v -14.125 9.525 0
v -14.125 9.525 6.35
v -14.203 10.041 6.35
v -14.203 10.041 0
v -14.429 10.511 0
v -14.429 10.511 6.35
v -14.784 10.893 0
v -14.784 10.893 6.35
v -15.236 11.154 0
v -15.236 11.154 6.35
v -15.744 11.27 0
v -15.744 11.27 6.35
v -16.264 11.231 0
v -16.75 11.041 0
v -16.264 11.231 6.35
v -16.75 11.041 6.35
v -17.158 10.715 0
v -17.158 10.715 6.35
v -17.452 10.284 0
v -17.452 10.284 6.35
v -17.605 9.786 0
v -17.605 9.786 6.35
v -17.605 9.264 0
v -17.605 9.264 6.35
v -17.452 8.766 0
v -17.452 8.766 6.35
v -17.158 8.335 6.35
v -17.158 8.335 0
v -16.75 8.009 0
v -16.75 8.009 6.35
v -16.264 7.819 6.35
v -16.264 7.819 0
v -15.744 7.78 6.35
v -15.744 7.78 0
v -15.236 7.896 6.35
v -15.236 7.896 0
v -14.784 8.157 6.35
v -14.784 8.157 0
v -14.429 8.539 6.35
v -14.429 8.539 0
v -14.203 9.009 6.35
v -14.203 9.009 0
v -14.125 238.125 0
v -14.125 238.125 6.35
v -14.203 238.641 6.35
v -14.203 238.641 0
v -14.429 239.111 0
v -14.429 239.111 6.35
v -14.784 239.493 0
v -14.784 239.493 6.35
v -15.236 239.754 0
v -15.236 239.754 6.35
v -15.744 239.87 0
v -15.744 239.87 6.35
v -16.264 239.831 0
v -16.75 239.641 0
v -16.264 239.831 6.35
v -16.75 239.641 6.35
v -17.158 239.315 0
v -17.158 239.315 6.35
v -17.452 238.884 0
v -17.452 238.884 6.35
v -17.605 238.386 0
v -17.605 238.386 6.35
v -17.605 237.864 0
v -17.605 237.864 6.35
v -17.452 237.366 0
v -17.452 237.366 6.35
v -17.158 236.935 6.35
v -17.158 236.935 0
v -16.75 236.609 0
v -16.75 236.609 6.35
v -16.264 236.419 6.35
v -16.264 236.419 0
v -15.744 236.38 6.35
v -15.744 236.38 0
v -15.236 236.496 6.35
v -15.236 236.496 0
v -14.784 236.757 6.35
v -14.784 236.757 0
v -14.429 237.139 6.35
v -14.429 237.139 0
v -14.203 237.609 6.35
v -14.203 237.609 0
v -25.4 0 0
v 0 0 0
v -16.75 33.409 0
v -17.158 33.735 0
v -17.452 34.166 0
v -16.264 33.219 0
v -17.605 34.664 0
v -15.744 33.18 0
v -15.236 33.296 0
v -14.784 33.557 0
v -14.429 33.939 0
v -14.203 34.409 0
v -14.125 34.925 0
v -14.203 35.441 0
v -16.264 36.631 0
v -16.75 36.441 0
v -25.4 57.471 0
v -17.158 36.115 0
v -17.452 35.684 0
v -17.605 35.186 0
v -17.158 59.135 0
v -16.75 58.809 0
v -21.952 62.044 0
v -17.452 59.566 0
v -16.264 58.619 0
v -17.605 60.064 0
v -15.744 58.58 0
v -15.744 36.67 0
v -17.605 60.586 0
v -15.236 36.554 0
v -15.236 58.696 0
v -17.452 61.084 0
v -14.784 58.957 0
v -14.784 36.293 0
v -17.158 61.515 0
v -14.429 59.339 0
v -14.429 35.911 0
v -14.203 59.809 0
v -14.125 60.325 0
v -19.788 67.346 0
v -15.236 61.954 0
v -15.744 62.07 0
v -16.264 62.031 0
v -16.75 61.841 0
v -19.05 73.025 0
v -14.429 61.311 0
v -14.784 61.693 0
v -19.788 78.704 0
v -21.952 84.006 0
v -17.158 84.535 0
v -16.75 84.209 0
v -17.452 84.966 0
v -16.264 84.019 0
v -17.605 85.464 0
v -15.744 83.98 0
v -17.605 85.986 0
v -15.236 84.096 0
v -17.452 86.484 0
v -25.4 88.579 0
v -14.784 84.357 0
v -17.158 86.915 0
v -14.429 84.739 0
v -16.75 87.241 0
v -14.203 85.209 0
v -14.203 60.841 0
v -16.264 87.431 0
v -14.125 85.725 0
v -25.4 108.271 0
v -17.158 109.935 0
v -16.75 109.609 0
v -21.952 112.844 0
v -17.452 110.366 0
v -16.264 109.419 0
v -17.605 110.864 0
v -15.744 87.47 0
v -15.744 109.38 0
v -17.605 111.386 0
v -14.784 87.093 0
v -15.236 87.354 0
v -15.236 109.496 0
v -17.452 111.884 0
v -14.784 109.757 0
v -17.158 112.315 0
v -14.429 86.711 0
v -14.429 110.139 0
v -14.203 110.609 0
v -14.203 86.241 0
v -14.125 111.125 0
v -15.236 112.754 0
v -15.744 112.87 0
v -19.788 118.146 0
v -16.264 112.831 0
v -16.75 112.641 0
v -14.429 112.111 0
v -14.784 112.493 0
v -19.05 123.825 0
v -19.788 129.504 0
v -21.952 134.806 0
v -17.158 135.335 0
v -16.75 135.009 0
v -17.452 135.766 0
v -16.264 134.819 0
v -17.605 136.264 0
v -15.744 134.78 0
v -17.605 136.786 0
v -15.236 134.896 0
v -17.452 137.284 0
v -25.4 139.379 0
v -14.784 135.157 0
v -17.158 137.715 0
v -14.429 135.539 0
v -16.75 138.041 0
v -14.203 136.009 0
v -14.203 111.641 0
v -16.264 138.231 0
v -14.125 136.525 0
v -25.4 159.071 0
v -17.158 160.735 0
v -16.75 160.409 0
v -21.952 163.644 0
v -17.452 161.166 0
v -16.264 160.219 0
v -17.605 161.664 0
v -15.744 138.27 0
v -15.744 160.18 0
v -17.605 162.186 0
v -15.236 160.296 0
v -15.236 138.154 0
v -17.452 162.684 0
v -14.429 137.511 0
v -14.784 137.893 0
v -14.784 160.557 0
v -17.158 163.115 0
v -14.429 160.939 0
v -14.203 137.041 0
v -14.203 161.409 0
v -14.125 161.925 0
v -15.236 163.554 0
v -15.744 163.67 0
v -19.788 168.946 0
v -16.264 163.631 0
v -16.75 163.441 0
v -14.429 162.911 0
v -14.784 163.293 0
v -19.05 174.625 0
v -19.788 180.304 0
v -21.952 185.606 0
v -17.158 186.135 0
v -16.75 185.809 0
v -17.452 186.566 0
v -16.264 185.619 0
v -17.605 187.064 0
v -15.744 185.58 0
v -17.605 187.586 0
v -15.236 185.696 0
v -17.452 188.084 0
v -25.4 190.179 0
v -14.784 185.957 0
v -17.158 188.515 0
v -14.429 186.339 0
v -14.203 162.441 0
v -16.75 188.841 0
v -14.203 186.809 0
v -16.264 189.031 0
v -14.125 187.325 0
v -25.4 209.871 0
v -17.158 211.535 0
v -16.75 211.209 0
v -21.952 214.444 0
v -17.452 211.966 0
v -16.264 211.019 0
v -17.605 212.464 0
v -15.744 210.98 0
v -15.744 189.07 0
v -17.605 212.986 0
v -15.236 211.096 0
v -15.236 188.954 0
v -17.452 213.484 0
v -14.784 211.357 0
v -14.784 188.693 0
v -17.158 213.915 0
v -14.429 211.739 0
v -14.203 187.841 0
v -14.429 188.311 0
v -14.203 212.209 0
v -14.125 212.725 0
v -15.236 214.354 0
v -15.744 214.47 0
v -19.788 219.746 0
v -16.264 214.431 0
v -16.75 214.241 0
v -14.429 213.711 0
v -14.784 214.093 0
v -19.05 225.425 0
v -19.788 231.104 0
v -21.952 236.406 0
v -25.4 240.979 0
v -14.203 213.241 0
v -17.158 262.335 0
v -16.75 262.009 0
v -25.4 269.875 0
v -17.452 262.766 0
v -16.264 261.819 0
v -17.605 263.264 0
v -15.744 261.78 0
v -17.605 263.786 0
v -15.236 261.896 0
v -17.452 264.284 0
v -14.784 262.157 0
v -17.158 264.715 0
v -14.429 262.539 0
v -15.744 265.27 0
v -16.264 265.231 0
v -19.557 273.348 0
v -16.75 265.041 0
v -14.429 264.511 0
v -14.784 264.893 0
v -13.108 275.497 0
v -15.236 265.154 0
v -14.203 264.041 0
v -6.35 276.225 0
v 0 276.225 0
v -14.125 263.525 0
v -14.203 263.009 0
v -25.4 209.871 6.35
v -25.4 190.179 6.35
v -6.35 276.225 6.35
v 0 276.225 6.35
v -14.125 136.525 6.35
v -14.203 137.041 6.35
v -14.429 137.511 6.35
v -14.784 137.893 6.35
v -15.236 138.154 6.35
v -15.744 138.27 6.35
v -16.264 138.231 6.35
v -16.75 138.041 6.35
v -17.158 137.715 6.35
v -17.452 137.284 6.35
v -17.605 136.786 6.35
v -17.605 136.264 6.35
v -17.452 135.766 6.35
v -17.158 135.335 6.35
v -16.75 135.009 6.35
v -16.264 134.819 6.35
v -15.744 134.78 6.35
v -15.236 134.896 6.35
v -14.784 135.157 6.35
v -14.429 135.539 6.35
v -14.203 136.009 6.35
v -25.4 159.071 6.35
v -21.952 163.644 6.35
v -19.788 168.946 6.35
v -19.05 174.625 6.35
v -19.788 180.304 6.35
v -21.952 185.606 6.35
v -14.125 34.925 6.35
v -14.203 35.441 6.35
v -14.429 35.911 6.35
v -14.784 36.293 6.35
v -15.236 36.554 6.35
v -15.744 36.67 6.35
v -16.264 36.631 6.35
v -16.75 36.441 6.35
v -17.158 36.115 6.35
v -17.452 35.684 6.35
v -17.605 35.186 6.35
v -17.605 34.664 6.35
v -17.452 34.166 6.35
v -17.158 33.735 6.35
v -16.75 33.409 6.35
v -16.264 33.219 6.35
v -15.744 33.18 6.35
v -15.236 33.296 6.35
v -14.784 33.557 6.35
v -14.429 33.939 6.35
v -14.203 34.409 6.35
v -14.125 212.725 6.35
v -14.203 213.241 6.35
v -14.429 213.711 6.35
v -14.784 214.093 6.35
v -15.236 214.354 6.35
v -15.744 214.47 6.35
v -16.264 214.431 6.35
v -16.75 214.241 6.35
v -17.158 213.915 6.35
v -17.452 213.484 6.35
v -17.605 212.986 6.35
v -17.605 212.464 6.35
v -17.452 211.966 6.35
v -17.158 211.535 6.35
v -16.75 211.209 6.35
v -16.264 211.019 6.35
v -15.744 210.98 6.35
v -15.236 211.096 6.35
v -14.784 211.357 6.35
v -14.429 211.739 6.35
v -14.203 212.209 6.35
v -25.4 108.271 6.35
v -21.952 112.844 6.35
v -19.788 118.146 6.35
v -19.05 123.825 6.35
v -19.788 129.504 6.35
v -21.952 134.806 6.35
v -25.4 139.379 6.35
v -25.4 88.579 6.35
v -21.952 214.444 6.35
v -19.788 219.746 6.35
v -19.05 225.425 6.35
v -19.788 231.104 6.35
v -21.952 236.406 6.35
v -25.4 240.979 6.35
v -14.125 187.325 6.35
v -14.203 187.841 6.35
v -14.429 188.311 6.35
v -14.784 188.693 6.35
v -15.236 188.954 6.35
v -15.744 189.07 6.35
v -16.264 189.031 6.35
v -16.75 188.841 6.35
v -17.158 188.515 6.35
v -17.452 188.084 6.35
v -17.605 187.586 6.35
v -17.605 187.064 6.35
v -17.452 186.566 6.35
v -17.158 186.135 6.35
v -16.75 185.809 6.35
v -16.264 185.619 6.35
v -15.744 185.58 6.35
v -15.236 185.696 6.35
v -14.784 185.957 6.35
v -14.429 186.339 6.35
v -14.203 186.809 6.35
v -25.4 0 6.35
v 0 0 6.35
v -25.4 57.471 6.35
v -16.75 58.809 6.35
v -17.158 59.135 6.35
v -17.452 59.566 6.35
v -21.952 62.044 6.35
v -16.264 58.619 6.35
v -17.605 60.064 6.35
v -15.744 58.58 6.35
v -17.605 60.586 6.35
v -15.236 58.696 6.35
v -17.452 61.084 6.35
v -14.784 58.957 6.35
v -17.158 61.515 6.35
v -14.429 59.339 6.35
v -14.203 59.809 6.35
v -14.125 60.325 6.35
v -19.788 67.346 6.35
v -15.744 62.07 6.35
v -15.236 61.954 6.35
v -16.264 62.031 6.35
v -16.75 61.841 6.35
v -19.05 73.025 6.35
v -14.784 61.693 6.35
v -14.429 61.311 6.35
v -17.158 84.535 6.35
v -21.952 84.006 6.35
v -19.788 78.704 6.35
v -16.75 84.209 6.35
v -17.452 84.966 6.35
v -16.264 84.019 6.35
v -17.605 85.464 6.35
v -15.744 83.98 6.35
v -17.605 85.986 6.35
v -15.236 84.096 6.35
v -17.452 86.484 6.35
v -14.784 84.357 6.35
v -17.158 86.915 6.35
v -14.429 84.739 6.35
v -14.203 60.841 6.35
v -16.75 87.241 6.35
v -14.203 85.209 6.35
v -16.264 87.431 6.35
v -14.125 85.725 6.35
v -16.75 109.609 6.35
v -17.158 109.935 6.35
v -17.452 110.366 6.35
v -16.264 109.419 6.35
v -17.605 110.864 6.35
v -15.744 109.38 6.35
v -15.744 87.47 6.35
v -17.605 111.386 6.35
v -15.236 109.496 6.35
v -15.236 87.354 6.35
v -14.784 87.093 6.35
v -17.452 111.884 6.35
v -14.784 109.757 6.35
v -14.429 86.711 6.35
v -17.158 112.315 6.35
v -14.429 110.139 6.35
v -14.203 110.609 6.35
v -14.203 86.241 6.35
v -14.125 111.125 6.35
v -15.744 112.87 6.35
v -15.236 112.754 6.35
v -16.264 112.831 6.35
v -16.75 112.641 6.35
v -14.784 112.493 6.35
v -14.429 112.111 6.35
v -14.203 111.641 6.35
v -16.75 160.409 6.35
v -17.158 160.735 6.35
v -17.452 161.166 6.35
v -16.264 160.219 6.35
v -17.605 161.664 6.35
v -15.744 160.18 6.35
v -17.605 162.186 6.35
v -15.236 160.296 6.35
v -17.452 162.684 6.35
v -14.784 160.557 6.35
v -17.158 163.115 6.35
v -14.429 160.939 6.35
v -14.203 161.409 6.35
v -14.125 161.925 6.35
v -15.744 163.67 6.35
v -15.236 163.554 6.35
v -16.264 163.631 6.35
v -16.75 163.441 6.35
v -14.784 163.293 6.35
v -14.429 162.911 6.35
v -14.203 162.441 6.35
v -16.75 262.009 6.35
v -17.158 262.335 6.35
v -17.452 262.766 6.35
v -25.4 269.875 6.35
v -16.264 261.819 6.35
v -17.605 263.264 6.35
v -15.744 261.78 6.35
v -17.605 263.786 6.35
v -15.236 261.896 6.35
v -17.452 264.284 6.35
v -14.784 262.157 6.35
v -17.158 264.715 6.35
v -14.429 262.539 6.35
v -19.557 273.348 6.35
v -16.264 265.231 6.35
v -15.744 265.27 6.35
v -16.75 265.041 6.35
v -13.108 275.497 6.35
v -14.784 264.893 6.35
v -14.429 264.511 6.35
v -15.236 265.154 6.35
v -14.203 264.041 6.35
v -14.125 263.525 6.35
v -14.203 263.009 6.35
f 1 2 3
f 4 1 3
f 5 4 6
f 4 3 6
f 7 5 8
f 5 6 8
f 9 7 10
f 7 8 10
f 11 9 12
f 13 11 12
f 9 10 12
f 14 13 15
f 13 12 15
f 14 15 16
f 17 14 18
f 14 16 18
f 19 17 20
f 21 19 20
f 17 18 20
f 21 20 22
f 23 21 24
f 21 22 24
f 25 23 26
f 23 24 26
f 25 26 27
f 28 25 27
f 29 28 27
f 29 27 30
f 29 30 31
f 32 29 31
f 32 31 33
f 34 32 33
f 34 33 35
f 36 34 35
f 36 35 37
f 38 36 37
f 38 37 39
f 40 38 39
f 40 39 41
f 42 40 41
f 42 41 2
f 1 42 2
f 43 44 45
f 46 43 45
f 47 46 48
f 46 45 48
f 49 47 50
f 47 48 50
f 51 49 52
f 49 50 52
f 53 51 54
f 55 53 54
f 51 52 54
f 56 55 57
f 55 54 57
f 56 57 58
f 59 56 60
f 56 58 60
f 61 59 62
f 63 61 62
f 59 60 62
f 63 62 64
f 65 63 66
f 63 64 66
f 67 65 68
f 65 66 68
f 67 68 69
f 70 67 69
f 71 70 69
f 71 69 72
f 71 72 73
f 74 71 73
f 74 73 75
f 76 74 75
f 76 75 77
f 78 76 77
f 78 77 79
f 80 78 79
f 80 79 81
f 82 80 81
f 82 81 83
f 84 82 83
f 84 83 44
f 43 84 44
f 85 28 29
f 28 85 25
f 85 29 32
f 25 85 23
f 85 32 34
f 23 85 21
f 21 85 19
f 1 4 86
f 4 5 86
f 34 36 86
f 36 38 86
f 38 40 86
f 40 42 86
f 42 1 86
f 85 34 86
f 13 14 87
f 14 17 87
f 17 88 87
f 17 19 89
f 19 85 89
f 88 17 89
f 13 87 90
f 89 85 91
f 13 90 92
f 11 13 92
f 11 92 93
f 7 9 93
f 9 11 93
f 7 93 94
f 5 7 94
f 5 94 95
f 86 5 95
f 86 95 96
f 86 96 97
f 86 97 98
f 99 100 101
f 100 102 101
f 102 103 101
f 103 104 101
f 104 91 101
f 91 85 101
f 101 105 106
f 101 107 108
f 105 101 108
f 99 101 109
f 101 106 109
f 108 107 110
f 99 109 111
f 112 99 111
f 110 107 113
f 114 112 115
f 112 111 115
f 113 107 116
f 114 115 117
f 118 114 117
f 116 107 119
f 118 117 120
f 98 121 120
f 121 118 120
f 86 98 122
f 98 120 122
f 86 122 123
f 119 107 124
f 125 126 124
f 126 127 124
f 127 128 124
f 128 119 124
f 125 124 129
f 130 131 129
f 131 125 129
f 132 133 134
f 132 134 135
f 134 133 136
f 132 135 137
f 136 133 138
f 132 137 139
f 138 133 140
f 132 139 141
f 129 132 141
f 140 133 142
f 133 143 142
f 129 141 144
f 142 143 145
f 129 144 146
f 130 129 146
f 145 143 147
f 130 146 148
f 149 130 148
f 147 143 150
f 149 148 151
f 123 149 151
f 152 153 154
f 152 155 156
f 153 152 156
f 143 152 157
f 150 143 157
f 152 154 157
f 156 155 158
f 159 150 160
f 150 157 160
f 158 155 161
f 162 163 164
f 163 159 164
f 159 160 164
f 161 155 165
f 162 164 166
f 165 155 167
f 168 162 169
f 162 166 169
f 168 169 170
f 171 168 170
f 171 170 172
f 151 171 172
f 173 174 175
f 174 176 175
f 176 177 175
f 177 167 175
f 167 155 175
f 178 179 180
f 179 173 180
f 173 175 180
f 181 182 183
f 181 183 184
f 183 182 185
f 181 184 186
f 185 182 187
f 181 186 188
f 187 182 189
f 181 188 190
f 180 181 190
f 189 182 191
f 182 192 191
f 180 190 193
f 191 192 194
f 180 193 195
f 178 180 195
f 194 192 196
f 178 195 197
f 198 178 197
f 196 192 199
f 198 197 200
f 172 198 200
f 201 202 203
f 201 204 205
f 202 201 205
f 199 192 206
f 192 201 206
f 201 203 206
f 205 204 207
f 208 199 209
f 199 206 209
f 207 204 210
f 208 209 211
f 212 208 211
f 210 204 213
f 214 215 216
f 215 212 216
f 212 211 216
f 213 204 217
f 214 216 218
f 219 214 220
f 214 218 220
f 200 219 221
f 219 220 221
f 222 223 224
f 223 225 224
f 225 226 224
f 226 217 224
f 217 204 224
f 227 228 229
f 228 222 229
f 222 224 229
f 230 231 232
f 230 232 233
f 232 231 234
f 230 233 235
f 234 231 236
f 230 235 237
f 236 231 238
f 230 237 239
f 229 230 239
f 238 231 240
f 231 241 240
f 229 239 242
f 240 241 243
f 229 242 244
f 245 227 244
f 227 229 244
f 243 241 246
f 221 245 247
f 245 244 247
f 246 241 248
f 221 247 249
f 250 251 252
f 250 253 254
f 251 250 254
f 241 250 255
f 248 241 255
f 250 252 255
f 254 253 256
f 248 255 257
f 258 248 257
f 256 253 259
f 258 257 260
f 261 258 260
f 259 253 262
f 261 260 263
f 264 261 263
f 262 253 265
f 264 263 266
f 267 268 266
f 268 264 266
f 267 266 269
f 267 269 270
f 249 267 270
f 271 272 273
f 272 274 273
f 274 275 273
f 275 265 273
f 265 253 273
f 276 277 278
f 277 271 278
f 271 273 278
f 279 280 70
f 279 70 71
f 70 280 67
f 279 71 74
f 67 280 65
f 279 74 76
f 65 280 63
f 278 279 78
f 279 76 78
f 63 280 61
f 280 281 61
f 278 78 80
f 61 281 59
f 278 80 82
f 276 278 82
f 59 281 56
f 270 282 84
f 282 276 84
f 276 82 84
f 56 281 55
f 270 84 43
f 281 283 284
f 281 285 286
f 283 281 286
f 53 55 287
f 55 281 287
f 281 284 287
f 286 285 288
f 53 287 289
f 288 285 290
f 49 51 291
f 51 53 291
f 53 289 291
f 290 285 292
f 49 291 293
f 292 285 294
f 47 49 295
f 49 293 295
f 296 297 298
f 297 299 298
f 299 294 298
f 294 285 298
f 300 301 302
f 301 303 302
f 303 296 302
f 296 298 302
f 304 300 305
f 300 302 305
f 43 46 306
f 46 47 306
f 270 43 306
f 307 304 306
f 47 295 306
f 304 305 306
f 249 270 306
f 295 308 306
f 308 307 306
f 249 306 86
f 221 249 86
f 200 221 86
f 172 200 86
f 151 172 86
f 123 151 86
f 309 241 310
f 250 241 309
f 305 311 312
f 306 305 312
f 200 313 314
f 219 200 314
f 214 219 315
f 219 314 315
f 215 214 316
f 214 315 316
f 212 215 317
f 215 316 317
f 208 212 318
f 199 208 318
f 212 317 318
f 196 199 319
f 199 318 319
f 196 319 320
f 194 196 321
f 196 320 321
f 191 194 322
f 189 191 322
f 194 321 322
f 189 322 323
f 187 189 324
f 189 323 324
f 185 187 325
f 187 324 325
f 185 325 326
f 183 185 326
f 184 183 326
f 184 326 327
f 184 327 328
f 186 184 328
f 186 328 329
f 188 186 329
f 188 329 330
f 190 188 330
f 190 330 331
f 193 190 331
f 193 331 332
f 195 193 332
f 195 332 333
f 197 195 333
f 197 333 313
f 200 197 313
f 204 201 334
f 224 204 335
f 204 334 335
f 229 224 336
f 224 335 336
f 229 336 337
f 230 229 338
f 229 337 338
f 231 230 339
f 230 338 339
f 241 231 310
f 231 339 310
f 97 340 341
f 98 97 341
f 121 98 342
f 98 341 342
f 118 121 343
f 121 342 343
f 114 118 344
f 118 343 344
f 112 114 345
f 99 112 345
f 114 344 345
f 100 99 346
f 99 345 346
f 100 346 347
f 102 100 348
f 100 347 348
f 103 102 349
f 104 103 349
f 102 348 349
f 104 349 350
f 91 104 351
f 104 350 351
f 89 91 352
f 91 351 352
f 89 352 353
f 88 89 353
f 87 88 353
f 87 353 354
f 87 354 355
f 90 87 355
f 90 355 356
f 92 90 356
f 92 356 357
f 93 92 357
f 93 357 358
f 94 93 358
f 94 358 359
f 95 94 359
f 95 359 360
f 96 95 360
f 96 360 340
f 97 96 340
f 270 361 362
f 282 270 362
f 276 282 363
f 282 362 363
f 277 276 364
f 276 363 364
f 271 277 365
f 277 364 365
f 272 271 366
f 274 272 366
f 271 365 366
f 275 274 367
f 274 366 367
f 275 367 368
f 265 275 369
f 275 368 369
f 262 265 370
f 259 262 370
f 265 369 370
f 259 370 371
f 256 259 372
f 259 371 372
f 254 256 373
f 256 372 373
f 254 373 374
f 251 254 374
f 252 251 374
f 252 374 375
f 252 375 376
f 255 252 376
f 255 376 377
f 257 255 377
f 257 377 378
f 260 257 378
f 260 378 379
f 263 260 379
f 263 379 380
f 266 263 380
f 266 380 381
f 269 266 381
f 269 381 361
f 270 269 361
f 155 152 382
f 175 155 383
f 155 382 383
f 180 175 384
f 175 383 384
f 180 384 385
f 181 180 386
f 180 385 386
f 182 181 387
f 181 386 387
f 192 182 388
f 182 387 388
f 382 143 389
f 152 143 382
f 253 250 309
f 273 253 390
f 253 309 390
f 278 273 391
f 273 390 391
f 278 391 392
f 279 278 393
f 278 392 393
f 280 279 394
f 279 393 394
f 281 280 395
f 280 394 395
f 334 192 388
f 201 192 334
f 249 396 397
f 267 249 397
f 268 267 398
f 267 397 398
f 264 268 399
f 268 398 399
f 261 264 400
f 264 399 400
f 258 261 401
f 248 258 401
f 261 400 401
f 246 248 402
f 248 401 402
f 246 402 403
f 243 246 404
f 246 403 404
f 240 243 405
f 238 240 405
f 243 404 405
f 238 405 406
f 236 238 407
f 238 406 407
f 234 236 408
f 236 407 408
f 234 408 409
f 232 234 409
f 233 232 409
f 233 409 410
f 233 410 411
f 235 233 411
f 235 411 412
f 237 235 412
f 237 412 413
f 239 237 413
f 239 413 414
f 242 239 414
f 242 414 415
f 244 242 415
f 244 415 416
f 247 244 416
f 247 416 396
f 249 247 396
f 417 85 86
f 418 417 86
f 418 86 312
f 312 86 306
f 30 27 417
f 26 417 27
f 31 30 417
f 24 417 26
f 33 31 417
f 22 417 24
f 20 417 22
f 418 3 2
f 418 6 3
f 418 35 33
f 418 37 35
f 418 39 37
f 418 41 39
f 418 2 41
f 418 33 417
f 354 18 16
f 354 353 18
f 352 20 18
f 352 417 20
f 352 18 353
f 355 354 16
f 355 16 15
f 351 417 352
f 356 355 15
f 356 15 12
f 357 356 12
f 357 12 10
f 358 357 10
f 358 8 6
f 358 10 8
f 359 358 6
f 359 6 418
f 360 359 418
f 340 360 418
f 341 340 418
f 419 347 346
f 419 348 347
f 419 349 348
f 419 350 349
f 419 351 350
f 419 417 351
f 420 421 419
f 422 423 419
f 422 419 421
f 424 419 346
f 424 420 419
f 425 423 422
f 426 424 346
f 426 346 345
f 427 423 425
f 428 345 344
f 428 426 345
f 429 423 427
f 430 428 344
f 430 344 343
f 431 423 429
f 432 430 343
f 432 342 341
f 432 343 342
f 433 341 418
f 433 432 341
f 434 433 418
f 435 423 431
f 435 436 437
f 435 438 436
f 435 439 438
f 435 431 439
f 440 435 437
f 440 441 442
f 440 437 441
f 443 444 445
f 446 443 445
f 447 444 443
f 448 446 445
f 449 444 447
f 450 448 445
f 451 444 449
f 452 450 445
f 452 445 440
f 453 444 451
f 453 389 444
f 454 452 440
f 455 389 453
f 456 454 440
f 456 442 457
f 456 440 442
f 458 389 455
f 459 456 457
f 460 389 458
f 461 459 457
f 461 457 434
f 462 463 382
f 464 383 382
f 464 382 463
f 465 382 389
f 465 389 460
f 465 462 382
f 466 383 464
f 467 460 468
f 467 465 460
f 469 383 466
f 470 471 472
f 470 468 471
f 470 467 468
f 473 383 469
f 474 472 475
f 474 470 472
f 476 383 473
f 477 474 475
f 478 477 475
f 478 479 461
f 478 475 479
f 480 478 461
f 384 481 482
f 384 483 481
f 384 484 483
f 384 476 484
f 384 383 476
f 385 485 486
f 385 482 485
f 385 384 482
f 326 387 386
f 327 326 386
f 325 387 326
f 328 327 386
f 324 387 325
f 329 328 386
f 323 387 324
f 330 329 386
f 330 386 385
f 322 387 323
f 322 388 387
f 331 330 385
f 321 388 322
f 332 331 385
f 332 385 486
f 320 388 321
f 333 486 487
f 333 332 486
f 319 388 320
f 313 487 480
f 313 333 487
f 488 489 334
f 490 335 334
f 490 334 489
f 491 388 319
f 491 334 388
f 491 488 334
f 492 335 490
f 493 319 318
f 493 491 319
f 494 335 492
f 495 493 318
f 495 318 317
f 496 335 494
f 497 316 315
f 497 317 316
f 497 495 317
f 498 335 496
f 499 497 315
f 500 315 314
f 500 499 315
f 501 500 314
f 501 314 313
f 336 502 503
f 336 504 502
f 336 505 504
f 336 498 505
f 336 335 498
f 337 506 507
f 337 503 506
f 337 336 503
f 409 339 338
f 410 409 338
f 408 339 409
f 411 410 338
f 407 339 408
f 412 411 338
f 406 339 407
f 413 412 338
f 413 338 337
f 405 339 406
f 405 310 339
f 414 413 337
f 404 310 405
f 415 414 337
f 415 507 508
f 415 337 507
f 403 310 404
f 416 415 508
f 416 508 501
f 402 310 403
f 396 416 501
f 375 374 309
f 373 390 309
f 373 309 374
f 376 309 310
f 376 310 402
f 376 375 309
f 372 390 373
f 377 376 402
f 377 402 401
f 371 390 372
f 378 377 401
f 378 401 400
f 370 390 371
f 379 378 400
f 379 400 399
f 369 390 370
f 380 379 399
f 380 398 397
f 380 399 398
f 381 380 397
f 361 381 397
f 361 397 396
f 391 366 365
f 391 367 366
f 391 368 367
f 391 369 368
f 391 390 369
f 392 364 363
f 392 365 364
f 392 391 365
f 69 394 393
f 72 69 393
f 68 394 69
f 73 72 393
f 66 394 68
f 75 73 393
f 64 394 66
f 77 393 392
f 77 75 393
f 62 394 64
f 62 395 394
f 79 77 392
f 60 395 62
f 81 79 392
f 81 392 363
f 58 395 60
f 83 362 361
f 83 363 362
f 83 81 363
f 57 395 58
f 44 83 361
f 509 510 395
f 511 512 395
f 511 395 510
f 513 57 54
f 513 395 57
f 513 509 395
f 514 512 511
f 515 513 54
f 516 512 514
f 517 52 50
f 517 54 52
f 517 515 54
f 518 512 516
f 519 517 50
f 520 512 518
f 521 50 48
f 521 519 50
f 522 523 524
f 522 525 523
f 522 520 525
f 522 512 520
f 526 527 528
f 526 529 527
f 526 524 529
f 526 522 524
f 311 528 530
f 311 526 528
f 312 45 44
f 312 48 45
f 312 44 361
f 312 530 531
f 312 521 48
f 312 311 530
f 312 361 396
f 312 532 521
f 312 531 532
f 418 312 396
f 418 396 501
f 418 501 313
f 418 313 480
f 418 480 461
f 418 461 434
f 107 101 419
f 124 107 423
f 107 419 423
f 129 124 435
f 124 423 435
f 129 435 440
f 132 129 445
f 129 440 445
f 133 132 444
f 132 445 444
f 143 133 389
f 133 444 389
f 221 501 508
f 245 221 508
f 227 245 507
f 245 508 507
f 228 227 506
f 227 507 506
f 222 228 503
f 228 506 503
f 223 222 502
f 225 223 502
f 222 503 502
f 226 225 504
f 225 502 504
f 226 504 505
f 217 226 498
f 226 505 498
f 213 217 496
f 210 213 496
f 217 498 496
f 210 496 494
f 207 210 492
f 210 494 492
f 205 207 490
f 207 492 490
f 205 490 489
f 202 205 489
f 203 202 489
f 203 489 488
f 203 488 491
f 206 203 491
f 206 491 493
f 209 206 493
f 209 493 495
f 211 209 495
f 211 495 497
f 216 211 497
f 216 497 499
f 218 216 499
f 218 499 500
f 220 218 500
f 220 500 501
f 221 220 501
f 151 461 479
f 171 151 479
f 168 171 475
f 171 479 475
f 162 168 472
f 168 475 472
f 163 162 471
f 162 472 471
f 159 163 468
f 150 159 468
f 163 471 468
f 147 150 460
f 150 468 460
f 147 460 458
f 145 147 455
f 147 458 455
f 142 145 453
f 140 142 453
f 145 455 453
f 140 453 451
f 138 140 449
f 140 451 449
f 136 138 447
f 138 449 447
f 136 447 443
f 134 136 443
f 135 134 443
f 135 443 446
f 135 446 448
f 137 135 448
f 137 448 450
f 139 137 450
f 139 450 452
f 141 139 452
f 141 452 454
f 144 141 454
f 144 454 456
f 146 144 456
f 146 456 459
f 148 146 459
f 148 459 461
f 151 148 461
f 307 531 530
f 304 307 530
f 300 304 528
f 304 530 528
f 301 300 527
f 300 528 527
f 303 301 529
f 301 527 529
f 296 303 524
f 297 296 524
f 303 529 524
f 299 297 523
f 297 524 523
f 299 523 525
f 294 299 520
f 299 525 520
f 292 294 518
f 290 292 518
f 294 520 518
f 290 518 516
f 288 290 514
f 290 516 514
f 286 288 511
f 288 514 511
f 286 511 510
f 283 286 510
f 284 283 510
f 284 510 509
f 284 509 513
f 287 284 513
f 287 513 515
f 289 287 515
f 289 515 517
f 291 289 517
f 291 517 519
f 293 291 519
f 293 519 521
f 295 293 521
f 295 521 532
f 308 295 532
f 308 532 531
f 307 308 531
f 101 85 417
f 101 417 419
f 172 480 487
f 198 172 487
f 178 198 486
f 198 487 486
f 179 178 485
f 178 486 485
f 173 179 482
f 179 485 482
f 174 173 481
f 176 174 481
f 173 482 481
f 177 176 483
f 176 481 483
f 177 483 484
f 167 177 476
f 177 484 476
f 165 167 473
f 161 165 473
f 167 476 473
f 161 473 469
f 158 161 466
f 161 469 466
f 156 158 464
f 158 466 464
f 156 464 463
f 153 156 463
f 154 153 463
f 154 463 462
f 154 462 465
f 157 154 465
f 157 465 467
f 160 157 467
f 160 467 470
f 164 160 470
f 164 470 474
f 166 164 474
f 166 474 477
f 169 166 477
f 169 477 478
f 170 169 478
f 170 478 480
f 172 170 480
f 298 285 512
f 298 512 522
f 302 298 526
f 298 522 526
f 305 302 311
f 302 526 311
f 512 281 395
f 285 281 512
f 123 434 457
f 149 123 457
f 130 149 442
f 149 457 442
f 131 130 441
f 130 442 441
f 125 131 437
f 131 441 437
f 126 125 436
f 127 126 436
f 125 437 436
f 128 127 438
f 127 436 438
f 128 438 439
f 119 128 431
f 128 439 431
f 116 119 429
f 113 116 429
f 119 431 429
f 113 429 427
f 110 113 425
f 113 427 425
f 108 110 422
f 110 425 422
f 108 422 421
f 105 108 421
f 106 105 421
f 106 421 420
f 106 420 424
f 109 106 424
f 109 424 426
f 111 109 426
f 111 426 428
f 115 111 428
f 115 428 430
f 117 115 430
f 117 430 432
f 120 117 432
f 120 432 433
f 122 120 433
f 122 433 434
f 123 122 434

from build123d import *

# Parameters (mm, degrees)
SKETCH1_W           = 25.4
SKETCH1_H           = 276.225
BOSS_EXTRUDE1_DEPTH = 6.35
CUT_EXTRUDE1_DEPTH  = 7.35
SKETCH3_R           = 1.75
CUT_EXTRUDE2_DEPTH  = 7.35
LPATTERN1_COUNT     = 11
LPATTERN1_PITCH     = 25.4
SKETCH4_R           = 22.225
CUT_EXTRUDE3_DEPTH  = 7.35
LPATTERN2_COUNT     = 4
LPATTERN2_PITCH     = 50.8


with BuildPart() as part:
    # Sketch1 → Boss-Extrude1 (new body)
    with BuildSketch(Plane.XY):
        with Locations((-12.7, 138.1125)):
            Rectangle(SKETCH1_W, SKETCH1_H)
    extrude(amount=BOSS_EXTRUDE1_DEPTH)

    # Sketch2 → Cut-Extrude1 (cut, through all)
    with BuildSketch(Plane.XY.offset(6.35)):
        with BuildLine():
            Line((-6.35, 276.225), (-31.763279736, 276.225))
            Line((-31.763279736, 276.225), (-31.763279736, 263.507280815))
            ThreePointArc((-31.763279736, 263.507280815), (-20.55893353, 272.86811022), (-6.35, 276.225))
        make_face()
    extrude(amount=-CUT_EXTRUDE1_DEPTH, mode=Mode.SUBTRACT)

    # Sketch3 → Cut-Extrude2 (cut, through all)
    with BuildSketch(Plane.XY.offset(6.35)):
        with Locations((-15.875, 263.525)):
            Circle(SKETCH3_R)
    cut_extrude2 = extrude(amount=-CUT_EXTRUDE2_DEPTH, mode=Mode.SUBTRACT)

    # LPattern1: Cut-Extrude2 ×11
    with Locations(*[(0, -i * LPATTERN1_PITCH, 0) for i in range(1, LPATTERN1_COUNT)]):
        add(cut_extrude2, mode=Mode.SUBTRACT)

    # Sketch4 → Cut-Extrude3 (cut, through all)
    with BuildSketch(Plane.XY.offset(6.35)):
        with Locations((-41.275, 225.425)):
            Circle(SKETCH4_R)
    cut_extrude3 = extrude(amount=-CUT_EXTRUDE3_DEPTH, mode=Mode.SUBTRACT)

    # LPattern2: Cut-Extrude3 ×4
    with Locations(*[(0, -i * LPATTERN2_PITCH, 0) for i in range(1, LPATTERN2_COUNT)]):
        add(cut_extrude3, mode=Mode.SUBTRACT)


solid = part.part
